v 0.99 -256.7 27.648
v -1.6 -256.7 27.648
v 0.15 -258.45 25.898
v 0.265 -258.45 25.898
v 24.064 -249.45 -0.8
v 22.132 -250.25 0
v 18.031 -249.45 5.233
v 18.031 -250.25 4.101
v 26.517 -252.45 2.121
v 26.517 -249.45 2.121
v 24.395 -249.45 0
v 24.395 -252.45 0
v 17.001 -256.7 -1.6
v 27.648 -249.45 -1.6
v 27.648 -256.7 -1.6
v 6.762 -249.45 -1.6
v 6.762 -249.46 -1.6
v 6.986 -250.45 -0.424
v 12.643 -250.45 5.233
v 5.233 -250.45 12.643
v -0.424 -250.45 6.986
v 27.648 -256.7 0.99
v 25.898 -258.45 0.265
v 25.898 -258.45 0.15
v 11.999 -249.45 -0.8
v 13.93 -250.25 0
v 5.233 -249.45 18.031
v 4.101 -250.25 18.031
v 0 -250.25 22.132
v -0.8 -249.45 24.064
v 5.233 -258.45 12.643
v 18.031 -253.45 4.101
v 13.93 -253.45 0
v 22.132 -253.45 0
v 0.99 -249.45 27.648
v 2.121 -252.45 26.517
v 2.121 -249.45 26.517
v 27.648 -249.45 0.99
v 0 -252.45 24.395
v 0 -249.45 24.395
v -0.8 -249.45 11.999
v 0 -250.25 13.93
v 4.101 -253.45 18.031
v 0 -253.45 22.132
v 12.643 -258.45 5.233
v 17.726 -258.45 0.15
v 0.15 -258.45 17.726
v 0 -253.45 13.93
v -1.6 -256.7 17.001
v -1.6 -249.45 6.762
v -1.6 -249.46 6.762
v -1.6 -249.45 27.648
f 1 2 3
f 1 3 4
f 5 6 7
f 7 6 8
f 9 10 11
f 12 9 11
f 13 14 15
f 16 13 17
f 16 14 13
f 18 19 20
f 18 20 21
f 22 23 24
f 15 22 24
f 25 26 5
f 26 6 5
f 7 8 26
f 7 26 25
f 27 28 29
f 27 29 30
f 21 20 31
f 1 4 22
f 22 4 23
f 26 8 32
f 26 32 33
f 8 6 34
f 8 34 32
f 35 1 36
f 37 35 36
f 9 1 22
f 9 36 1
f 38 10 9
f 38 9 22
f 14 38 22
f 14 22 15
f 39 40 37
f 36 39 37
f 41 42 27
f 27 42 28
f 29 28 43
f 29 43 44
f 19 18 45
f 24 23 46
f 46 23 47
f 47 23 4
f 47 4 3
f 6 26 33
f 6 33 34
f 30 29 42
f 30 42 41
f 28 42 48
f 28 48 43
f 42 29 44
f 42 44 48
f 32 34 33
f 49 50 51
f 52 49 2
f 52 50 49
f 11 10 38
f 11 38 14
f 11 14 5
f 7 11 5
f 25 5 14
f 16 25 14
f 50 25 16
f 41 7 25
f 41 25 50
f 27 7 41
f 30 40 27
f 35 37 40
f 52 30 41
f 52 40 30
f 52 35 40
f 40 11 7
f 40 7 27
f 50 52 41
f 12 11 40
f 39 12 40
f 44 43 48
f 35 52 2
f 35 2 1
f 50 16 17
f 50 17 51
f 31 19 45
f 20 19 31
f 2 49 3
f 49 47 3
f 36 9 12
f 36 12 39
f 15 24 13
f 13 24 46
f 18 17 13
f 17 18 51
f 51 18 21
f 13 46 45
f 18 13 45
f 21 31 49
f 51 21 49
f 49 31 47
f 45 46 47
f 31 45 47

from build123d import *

# Parameters (mm, degrees)
PAD005_DEPTH    = 9
POCKET002_DEPTH = 4
CHAMFER002_SIZE = 0.8
POCKET008_DEPTH = 3
CHAMFER007_SIZE = 1.75
CHAMFER008_SIZE = 8.99
POCKET013_DEPTH = 8.001


with BuildPart() as part:
    # Sketch008 → Pad005 (new body)
    with BuildSketch(Plane(origin=(0, 0, 249.45), x_dir=(1, 0, 0), z_dir=(0, -1, 0))):
        Polygon((0.989949, -221.802125), (27.647875, -248.460051), (27.647875, -251.05), (6.76188, -251.05), (-1.6, -242.68812), (-1.6, -221.802125), align=None)
    extrude(amount=PAD005_DEPTH)

    # Sketch009 (on Face7 of Pad005) → Pocket002 (cut)
    with BuildSketch(Plane(origin=(0, 0, 0), x_dir=(1, 0, 0), z_dir=(0, 1, 0))):
        Polygon((22.132442, 0), (18.031223, -4.101219), (13.930004, 0), align=None)
        Polygon((0, -22.132442), (0, -13.930004), (4.101219, -18.031223), align=None)
    extrude(amount=-POCKET002_DEPTH, mode=Mode.SUBTRACT)

    # Chamfer002
    chamfer002_edges = [part.edges().sort_by_distance(p)[0] for p in [
        (18.031223, 0, 0),
        (20.081833, 0, 2.05061),
        (15.980613, 0, 2.05061),
        (0, 0, 18.031223),
        (2.05061, 0, 20.081833),
        (2.05061, 0, 15.980613),
    ]]
    chamfer(chamfer002_edges, length=CHAMFER002_SIZE)

    # Sketch050 → Pocket008 (cut)
    with BuildSketch(Plane(origin=(0, 0, 249.45), x_dir=(1, 0, 0), z_dir=(0, -1, 0))):
        Polygon((0, -225.054816), (2.12132, -222.933496), (26.516504, -247.32868), (24.395184, -249.45), align=None)
    extrude(amount=POCKET008_DEPTH, mode=Mode.SUBTRACT)

    # Chamfer007
    chamfer007_edges = [part.edges().sort_by_distance(p)[0] for p in [
        (17.204877, -9, -1.6),
        (27.647875, -9, -0.305025),
        (14.318912, -9, 14.318912),
        (-1.6, -9, 17.204877),
        (-0.305025, -9, 27.647875),
    ]]
    chamfer(chamfer007_edges, length=CHAMFER007_SIZE)

    # Chamfer008
    chamfer008_edges = [part.edges().sort_by_distance(p)[0] for p in [
        (2.58094, -9, 2.58094),
    ]]
    chamfer(chamfer008_edges, length=CHAMFER008_SIZE)

    # Sketch059 (on Face4 of Chamfer008) → Pocket013 (cut, through all)
    with BuildSketch(Plane(origin=(0, -1, 0), x_dir=(1, 0, 0), z_dir=(0, 1, 0))):
        Polygon((12.643069, -5.23259), (5.23259, -12.643069), (-2.177889, -5.23259), (5.23259, 2.177889), align=None)
    extrude(amount=-POCKET013_DEPTH, mode=Mode.SUBTRACT)


with BuildPart() as part_1:
    # Body001 placement: moved
    add(part.part.moved(Location((0, -249.45, 0))))


solid = part_1.part
